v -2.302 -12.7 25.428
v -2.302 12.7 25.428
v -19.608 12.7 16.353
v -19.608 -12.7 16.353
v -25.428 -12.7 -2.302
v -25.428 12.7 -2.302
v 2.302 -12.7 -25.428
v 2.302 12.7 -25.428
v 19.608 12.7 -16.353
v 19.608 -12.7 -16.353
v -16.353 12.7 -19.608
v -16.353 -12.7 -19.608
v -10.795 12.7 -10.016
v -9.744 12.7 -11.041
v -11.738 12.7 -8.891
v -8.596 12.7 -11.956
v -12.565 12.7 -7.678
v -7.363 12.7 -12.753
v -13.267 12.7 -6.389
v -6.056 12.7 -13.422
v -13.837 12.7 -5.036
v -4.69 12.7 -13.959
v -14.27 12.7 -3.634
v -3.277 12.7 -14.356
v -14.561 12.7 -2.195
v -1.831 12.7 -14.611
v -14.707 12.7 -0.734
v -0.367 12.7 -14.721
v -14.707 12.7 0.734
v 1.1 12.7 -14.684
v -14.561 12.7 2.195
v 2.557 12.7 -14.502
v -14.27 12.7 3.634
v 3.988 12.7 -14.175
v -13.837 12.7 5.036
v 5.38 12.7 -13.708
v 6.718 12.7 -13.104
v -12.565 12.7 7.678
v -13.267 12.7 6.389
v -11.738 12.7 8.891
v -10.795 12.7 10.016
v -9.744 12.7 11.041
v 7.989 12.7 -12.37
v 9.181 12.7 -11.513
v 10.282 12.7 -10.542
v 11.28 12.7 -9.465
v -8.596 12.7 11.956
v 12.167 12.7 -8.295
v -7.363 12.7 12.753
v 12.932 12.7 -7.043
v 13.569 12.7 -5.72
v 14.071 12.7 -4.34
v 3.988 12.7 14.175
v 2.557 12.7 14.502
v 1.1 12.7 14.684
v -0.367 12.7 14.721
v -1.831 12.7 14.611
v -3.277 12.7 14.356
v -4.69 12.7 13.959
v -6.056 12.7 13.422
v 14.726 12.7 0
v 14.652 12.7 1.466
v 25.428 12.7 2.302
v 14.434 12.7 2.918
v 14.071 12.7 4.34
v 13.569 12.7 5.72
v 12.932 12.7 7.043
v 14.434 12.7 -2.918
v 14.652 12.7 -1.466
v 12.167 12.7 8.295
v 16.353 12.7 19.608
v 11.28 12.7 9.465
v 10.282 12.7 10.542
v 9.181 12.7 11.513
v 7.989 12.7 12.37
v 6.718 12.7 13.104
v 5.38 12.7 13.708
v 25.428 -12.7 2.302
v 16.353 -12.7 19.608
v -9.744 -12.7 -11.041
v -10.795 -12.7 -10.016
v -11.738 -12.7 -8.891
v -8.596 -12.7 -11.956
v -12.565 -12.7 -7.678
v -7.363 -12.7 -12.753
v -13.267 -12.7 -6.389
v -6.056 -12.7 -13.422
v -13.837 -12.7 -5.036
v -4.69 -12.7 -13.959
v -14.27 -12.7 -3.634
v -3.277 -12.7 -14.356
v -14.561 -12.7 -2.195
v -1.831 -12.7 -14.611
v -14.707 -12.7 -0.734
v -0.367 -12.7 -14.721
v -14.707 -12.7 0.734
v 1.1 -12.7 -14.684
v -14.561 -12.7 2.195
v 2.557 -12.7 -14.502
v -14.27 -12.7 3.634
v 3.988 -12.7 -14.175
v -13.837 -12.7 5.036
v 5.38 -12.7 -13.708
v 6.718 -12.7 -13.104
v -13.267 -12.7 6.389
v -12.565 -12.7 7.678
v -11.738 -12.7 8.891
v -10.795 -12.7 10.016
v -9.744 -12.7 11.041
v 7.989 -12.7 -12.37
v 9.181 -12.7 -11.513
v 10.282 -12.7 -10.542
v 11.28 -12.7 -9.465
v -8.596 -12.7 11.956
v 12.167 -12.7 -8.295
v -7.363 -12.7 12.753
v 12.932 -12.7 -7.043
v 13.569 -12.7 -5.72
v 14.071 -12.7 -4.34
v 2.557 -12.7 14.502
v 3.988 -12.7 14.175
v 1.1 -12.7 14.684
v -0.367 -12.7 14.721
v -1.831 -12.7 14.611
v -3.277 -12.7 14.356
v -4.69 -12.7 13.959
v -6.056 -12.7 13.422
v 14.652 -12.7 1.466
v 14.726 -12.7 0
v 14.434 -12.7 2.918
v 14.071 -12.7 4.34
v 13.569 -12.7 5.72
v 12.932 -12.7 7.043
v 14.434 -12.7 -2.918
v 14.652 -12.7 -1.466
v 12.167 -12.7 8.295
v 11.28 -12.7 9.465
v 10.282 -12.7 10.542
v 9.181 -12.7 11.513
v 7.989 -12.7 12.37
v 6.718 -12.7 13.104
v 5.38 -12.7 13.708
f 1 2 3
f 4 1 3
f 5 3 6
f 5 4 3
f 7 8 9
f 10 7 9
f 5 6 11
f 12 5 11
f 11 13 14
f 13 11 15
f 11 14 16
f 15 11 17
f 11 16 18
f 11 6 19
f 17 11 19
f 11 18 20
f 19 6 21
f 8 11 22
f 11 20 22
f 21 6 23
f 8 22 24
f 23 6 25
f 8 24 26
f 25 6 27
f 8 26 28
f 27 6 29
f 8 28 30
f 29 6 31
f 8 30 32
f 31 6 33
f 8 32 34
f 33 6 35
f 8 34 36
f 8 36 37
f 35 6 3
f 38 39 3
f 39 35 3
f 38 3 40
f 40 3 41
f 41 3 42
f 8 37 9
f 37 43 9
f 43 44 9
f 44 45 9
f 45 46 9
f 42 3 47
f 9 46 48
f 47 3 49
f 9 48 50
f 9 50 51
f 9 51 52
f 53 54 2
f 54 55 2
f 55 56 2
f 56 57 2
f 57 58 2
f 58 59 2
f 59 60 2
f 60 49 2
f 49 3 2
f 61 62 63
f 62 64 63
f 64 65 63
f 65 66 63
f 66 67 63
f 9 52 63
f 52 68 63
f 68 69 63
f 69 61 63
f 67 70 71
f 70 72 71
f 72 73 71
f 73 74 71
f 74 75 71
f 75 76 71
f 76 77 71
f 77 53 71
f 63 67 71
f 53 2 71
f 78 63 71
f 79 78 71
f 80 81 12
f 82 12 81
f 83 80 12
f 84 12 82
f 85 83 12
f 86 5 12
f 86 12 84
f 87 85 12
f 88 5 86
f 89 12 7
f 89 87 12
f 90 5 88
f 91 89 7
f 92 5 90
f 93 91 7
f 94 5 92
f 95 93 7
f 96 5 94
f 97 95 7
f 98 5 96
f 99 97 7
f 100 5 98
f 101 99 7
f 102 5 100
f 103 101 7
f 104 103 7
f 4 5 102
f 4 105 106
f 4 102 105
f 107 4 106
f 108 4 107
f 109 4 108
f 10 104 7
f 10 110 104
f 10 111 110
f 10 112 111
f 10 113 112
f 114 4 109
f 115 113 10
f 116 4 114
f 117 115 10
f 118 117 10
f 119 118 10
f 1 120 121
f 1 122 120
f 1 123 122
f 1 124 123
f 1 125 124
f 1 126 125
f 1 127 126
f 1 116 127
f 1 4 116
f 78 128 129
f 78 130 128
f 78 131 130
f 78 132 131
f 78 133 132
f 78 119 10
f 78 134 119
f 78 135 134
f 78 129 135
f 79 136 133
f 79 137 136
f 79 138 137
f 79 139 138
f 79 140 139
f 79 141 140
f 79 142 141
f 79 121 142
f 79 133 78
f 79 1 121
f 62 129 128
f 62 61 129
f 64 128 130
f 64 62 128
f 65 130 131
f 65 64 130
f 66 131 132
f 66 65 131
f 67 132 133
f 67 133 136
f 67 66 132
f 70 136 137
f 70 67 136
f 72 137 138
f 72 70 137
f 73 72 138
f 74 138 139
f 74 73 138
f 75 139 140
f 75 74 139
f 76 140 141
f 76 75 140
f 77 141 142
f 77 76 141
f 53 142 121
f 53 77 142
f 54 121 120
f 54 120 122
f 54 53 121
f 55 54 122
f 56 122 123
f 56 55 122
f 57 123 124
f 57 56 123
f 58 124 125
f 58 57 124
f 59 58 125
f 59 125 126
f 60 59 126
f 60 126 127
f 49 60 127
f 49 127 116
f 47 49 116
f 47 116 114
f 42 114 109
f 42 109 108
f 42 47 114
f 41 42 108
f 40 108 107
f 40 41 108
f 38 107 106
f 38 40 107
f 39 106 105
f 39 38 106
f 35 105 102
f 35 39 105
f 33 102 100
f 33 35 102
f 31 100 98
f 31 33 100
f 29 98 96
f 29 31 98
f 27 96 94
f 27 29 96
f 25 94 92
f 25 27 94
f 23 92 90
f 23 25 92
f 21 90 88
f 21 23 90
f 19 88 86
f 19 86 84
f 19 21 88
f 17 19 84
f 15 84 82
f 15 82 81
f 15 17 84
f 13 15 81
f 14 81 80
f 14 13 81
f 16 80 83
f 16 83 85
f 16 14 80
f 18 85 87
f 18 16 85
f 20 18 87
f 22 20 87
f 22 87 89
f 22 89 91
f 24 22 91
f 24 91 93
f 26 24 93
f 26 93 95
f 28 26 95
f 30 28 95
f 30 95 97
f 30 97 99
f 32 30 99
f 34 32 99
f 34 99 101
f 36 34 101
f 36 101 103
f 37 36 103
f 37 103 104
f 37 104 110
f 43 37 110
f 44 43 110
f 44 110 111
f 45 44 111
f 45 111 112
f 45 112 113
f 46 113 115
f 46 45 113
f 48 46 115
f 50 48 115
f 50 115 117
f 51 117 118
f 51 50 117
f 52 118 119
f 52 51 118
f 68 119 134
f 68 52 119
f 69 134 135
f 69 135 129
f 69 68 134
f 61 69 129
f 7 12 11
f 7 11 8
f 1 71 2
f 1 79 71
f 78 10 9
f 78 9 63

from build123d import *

# Parameters (mm, degrees)
F0_R     = 14.725537
F1_DEPTH = 12.7


with BuildPart() as f1:
    # F0 (on Front) → F1 (new body, symmetric)
    with BuildSketch(Plane.XZ):
        Polygon((-19.607809, 16.352809), (-25.427997, -2.301632), (-16.352809, -19.607809), (2.301632, -25.427997), (19.607809, -16.352809), (25.427997, 2.301632), (16.352809, 19.607809), (-2.301632, 25.427997), align=None)
        Circle(F0_R, mode=Mode.SUBTRACT)
    extrude(amount=F1_DEPTH, both=True)


solid = f1.part
